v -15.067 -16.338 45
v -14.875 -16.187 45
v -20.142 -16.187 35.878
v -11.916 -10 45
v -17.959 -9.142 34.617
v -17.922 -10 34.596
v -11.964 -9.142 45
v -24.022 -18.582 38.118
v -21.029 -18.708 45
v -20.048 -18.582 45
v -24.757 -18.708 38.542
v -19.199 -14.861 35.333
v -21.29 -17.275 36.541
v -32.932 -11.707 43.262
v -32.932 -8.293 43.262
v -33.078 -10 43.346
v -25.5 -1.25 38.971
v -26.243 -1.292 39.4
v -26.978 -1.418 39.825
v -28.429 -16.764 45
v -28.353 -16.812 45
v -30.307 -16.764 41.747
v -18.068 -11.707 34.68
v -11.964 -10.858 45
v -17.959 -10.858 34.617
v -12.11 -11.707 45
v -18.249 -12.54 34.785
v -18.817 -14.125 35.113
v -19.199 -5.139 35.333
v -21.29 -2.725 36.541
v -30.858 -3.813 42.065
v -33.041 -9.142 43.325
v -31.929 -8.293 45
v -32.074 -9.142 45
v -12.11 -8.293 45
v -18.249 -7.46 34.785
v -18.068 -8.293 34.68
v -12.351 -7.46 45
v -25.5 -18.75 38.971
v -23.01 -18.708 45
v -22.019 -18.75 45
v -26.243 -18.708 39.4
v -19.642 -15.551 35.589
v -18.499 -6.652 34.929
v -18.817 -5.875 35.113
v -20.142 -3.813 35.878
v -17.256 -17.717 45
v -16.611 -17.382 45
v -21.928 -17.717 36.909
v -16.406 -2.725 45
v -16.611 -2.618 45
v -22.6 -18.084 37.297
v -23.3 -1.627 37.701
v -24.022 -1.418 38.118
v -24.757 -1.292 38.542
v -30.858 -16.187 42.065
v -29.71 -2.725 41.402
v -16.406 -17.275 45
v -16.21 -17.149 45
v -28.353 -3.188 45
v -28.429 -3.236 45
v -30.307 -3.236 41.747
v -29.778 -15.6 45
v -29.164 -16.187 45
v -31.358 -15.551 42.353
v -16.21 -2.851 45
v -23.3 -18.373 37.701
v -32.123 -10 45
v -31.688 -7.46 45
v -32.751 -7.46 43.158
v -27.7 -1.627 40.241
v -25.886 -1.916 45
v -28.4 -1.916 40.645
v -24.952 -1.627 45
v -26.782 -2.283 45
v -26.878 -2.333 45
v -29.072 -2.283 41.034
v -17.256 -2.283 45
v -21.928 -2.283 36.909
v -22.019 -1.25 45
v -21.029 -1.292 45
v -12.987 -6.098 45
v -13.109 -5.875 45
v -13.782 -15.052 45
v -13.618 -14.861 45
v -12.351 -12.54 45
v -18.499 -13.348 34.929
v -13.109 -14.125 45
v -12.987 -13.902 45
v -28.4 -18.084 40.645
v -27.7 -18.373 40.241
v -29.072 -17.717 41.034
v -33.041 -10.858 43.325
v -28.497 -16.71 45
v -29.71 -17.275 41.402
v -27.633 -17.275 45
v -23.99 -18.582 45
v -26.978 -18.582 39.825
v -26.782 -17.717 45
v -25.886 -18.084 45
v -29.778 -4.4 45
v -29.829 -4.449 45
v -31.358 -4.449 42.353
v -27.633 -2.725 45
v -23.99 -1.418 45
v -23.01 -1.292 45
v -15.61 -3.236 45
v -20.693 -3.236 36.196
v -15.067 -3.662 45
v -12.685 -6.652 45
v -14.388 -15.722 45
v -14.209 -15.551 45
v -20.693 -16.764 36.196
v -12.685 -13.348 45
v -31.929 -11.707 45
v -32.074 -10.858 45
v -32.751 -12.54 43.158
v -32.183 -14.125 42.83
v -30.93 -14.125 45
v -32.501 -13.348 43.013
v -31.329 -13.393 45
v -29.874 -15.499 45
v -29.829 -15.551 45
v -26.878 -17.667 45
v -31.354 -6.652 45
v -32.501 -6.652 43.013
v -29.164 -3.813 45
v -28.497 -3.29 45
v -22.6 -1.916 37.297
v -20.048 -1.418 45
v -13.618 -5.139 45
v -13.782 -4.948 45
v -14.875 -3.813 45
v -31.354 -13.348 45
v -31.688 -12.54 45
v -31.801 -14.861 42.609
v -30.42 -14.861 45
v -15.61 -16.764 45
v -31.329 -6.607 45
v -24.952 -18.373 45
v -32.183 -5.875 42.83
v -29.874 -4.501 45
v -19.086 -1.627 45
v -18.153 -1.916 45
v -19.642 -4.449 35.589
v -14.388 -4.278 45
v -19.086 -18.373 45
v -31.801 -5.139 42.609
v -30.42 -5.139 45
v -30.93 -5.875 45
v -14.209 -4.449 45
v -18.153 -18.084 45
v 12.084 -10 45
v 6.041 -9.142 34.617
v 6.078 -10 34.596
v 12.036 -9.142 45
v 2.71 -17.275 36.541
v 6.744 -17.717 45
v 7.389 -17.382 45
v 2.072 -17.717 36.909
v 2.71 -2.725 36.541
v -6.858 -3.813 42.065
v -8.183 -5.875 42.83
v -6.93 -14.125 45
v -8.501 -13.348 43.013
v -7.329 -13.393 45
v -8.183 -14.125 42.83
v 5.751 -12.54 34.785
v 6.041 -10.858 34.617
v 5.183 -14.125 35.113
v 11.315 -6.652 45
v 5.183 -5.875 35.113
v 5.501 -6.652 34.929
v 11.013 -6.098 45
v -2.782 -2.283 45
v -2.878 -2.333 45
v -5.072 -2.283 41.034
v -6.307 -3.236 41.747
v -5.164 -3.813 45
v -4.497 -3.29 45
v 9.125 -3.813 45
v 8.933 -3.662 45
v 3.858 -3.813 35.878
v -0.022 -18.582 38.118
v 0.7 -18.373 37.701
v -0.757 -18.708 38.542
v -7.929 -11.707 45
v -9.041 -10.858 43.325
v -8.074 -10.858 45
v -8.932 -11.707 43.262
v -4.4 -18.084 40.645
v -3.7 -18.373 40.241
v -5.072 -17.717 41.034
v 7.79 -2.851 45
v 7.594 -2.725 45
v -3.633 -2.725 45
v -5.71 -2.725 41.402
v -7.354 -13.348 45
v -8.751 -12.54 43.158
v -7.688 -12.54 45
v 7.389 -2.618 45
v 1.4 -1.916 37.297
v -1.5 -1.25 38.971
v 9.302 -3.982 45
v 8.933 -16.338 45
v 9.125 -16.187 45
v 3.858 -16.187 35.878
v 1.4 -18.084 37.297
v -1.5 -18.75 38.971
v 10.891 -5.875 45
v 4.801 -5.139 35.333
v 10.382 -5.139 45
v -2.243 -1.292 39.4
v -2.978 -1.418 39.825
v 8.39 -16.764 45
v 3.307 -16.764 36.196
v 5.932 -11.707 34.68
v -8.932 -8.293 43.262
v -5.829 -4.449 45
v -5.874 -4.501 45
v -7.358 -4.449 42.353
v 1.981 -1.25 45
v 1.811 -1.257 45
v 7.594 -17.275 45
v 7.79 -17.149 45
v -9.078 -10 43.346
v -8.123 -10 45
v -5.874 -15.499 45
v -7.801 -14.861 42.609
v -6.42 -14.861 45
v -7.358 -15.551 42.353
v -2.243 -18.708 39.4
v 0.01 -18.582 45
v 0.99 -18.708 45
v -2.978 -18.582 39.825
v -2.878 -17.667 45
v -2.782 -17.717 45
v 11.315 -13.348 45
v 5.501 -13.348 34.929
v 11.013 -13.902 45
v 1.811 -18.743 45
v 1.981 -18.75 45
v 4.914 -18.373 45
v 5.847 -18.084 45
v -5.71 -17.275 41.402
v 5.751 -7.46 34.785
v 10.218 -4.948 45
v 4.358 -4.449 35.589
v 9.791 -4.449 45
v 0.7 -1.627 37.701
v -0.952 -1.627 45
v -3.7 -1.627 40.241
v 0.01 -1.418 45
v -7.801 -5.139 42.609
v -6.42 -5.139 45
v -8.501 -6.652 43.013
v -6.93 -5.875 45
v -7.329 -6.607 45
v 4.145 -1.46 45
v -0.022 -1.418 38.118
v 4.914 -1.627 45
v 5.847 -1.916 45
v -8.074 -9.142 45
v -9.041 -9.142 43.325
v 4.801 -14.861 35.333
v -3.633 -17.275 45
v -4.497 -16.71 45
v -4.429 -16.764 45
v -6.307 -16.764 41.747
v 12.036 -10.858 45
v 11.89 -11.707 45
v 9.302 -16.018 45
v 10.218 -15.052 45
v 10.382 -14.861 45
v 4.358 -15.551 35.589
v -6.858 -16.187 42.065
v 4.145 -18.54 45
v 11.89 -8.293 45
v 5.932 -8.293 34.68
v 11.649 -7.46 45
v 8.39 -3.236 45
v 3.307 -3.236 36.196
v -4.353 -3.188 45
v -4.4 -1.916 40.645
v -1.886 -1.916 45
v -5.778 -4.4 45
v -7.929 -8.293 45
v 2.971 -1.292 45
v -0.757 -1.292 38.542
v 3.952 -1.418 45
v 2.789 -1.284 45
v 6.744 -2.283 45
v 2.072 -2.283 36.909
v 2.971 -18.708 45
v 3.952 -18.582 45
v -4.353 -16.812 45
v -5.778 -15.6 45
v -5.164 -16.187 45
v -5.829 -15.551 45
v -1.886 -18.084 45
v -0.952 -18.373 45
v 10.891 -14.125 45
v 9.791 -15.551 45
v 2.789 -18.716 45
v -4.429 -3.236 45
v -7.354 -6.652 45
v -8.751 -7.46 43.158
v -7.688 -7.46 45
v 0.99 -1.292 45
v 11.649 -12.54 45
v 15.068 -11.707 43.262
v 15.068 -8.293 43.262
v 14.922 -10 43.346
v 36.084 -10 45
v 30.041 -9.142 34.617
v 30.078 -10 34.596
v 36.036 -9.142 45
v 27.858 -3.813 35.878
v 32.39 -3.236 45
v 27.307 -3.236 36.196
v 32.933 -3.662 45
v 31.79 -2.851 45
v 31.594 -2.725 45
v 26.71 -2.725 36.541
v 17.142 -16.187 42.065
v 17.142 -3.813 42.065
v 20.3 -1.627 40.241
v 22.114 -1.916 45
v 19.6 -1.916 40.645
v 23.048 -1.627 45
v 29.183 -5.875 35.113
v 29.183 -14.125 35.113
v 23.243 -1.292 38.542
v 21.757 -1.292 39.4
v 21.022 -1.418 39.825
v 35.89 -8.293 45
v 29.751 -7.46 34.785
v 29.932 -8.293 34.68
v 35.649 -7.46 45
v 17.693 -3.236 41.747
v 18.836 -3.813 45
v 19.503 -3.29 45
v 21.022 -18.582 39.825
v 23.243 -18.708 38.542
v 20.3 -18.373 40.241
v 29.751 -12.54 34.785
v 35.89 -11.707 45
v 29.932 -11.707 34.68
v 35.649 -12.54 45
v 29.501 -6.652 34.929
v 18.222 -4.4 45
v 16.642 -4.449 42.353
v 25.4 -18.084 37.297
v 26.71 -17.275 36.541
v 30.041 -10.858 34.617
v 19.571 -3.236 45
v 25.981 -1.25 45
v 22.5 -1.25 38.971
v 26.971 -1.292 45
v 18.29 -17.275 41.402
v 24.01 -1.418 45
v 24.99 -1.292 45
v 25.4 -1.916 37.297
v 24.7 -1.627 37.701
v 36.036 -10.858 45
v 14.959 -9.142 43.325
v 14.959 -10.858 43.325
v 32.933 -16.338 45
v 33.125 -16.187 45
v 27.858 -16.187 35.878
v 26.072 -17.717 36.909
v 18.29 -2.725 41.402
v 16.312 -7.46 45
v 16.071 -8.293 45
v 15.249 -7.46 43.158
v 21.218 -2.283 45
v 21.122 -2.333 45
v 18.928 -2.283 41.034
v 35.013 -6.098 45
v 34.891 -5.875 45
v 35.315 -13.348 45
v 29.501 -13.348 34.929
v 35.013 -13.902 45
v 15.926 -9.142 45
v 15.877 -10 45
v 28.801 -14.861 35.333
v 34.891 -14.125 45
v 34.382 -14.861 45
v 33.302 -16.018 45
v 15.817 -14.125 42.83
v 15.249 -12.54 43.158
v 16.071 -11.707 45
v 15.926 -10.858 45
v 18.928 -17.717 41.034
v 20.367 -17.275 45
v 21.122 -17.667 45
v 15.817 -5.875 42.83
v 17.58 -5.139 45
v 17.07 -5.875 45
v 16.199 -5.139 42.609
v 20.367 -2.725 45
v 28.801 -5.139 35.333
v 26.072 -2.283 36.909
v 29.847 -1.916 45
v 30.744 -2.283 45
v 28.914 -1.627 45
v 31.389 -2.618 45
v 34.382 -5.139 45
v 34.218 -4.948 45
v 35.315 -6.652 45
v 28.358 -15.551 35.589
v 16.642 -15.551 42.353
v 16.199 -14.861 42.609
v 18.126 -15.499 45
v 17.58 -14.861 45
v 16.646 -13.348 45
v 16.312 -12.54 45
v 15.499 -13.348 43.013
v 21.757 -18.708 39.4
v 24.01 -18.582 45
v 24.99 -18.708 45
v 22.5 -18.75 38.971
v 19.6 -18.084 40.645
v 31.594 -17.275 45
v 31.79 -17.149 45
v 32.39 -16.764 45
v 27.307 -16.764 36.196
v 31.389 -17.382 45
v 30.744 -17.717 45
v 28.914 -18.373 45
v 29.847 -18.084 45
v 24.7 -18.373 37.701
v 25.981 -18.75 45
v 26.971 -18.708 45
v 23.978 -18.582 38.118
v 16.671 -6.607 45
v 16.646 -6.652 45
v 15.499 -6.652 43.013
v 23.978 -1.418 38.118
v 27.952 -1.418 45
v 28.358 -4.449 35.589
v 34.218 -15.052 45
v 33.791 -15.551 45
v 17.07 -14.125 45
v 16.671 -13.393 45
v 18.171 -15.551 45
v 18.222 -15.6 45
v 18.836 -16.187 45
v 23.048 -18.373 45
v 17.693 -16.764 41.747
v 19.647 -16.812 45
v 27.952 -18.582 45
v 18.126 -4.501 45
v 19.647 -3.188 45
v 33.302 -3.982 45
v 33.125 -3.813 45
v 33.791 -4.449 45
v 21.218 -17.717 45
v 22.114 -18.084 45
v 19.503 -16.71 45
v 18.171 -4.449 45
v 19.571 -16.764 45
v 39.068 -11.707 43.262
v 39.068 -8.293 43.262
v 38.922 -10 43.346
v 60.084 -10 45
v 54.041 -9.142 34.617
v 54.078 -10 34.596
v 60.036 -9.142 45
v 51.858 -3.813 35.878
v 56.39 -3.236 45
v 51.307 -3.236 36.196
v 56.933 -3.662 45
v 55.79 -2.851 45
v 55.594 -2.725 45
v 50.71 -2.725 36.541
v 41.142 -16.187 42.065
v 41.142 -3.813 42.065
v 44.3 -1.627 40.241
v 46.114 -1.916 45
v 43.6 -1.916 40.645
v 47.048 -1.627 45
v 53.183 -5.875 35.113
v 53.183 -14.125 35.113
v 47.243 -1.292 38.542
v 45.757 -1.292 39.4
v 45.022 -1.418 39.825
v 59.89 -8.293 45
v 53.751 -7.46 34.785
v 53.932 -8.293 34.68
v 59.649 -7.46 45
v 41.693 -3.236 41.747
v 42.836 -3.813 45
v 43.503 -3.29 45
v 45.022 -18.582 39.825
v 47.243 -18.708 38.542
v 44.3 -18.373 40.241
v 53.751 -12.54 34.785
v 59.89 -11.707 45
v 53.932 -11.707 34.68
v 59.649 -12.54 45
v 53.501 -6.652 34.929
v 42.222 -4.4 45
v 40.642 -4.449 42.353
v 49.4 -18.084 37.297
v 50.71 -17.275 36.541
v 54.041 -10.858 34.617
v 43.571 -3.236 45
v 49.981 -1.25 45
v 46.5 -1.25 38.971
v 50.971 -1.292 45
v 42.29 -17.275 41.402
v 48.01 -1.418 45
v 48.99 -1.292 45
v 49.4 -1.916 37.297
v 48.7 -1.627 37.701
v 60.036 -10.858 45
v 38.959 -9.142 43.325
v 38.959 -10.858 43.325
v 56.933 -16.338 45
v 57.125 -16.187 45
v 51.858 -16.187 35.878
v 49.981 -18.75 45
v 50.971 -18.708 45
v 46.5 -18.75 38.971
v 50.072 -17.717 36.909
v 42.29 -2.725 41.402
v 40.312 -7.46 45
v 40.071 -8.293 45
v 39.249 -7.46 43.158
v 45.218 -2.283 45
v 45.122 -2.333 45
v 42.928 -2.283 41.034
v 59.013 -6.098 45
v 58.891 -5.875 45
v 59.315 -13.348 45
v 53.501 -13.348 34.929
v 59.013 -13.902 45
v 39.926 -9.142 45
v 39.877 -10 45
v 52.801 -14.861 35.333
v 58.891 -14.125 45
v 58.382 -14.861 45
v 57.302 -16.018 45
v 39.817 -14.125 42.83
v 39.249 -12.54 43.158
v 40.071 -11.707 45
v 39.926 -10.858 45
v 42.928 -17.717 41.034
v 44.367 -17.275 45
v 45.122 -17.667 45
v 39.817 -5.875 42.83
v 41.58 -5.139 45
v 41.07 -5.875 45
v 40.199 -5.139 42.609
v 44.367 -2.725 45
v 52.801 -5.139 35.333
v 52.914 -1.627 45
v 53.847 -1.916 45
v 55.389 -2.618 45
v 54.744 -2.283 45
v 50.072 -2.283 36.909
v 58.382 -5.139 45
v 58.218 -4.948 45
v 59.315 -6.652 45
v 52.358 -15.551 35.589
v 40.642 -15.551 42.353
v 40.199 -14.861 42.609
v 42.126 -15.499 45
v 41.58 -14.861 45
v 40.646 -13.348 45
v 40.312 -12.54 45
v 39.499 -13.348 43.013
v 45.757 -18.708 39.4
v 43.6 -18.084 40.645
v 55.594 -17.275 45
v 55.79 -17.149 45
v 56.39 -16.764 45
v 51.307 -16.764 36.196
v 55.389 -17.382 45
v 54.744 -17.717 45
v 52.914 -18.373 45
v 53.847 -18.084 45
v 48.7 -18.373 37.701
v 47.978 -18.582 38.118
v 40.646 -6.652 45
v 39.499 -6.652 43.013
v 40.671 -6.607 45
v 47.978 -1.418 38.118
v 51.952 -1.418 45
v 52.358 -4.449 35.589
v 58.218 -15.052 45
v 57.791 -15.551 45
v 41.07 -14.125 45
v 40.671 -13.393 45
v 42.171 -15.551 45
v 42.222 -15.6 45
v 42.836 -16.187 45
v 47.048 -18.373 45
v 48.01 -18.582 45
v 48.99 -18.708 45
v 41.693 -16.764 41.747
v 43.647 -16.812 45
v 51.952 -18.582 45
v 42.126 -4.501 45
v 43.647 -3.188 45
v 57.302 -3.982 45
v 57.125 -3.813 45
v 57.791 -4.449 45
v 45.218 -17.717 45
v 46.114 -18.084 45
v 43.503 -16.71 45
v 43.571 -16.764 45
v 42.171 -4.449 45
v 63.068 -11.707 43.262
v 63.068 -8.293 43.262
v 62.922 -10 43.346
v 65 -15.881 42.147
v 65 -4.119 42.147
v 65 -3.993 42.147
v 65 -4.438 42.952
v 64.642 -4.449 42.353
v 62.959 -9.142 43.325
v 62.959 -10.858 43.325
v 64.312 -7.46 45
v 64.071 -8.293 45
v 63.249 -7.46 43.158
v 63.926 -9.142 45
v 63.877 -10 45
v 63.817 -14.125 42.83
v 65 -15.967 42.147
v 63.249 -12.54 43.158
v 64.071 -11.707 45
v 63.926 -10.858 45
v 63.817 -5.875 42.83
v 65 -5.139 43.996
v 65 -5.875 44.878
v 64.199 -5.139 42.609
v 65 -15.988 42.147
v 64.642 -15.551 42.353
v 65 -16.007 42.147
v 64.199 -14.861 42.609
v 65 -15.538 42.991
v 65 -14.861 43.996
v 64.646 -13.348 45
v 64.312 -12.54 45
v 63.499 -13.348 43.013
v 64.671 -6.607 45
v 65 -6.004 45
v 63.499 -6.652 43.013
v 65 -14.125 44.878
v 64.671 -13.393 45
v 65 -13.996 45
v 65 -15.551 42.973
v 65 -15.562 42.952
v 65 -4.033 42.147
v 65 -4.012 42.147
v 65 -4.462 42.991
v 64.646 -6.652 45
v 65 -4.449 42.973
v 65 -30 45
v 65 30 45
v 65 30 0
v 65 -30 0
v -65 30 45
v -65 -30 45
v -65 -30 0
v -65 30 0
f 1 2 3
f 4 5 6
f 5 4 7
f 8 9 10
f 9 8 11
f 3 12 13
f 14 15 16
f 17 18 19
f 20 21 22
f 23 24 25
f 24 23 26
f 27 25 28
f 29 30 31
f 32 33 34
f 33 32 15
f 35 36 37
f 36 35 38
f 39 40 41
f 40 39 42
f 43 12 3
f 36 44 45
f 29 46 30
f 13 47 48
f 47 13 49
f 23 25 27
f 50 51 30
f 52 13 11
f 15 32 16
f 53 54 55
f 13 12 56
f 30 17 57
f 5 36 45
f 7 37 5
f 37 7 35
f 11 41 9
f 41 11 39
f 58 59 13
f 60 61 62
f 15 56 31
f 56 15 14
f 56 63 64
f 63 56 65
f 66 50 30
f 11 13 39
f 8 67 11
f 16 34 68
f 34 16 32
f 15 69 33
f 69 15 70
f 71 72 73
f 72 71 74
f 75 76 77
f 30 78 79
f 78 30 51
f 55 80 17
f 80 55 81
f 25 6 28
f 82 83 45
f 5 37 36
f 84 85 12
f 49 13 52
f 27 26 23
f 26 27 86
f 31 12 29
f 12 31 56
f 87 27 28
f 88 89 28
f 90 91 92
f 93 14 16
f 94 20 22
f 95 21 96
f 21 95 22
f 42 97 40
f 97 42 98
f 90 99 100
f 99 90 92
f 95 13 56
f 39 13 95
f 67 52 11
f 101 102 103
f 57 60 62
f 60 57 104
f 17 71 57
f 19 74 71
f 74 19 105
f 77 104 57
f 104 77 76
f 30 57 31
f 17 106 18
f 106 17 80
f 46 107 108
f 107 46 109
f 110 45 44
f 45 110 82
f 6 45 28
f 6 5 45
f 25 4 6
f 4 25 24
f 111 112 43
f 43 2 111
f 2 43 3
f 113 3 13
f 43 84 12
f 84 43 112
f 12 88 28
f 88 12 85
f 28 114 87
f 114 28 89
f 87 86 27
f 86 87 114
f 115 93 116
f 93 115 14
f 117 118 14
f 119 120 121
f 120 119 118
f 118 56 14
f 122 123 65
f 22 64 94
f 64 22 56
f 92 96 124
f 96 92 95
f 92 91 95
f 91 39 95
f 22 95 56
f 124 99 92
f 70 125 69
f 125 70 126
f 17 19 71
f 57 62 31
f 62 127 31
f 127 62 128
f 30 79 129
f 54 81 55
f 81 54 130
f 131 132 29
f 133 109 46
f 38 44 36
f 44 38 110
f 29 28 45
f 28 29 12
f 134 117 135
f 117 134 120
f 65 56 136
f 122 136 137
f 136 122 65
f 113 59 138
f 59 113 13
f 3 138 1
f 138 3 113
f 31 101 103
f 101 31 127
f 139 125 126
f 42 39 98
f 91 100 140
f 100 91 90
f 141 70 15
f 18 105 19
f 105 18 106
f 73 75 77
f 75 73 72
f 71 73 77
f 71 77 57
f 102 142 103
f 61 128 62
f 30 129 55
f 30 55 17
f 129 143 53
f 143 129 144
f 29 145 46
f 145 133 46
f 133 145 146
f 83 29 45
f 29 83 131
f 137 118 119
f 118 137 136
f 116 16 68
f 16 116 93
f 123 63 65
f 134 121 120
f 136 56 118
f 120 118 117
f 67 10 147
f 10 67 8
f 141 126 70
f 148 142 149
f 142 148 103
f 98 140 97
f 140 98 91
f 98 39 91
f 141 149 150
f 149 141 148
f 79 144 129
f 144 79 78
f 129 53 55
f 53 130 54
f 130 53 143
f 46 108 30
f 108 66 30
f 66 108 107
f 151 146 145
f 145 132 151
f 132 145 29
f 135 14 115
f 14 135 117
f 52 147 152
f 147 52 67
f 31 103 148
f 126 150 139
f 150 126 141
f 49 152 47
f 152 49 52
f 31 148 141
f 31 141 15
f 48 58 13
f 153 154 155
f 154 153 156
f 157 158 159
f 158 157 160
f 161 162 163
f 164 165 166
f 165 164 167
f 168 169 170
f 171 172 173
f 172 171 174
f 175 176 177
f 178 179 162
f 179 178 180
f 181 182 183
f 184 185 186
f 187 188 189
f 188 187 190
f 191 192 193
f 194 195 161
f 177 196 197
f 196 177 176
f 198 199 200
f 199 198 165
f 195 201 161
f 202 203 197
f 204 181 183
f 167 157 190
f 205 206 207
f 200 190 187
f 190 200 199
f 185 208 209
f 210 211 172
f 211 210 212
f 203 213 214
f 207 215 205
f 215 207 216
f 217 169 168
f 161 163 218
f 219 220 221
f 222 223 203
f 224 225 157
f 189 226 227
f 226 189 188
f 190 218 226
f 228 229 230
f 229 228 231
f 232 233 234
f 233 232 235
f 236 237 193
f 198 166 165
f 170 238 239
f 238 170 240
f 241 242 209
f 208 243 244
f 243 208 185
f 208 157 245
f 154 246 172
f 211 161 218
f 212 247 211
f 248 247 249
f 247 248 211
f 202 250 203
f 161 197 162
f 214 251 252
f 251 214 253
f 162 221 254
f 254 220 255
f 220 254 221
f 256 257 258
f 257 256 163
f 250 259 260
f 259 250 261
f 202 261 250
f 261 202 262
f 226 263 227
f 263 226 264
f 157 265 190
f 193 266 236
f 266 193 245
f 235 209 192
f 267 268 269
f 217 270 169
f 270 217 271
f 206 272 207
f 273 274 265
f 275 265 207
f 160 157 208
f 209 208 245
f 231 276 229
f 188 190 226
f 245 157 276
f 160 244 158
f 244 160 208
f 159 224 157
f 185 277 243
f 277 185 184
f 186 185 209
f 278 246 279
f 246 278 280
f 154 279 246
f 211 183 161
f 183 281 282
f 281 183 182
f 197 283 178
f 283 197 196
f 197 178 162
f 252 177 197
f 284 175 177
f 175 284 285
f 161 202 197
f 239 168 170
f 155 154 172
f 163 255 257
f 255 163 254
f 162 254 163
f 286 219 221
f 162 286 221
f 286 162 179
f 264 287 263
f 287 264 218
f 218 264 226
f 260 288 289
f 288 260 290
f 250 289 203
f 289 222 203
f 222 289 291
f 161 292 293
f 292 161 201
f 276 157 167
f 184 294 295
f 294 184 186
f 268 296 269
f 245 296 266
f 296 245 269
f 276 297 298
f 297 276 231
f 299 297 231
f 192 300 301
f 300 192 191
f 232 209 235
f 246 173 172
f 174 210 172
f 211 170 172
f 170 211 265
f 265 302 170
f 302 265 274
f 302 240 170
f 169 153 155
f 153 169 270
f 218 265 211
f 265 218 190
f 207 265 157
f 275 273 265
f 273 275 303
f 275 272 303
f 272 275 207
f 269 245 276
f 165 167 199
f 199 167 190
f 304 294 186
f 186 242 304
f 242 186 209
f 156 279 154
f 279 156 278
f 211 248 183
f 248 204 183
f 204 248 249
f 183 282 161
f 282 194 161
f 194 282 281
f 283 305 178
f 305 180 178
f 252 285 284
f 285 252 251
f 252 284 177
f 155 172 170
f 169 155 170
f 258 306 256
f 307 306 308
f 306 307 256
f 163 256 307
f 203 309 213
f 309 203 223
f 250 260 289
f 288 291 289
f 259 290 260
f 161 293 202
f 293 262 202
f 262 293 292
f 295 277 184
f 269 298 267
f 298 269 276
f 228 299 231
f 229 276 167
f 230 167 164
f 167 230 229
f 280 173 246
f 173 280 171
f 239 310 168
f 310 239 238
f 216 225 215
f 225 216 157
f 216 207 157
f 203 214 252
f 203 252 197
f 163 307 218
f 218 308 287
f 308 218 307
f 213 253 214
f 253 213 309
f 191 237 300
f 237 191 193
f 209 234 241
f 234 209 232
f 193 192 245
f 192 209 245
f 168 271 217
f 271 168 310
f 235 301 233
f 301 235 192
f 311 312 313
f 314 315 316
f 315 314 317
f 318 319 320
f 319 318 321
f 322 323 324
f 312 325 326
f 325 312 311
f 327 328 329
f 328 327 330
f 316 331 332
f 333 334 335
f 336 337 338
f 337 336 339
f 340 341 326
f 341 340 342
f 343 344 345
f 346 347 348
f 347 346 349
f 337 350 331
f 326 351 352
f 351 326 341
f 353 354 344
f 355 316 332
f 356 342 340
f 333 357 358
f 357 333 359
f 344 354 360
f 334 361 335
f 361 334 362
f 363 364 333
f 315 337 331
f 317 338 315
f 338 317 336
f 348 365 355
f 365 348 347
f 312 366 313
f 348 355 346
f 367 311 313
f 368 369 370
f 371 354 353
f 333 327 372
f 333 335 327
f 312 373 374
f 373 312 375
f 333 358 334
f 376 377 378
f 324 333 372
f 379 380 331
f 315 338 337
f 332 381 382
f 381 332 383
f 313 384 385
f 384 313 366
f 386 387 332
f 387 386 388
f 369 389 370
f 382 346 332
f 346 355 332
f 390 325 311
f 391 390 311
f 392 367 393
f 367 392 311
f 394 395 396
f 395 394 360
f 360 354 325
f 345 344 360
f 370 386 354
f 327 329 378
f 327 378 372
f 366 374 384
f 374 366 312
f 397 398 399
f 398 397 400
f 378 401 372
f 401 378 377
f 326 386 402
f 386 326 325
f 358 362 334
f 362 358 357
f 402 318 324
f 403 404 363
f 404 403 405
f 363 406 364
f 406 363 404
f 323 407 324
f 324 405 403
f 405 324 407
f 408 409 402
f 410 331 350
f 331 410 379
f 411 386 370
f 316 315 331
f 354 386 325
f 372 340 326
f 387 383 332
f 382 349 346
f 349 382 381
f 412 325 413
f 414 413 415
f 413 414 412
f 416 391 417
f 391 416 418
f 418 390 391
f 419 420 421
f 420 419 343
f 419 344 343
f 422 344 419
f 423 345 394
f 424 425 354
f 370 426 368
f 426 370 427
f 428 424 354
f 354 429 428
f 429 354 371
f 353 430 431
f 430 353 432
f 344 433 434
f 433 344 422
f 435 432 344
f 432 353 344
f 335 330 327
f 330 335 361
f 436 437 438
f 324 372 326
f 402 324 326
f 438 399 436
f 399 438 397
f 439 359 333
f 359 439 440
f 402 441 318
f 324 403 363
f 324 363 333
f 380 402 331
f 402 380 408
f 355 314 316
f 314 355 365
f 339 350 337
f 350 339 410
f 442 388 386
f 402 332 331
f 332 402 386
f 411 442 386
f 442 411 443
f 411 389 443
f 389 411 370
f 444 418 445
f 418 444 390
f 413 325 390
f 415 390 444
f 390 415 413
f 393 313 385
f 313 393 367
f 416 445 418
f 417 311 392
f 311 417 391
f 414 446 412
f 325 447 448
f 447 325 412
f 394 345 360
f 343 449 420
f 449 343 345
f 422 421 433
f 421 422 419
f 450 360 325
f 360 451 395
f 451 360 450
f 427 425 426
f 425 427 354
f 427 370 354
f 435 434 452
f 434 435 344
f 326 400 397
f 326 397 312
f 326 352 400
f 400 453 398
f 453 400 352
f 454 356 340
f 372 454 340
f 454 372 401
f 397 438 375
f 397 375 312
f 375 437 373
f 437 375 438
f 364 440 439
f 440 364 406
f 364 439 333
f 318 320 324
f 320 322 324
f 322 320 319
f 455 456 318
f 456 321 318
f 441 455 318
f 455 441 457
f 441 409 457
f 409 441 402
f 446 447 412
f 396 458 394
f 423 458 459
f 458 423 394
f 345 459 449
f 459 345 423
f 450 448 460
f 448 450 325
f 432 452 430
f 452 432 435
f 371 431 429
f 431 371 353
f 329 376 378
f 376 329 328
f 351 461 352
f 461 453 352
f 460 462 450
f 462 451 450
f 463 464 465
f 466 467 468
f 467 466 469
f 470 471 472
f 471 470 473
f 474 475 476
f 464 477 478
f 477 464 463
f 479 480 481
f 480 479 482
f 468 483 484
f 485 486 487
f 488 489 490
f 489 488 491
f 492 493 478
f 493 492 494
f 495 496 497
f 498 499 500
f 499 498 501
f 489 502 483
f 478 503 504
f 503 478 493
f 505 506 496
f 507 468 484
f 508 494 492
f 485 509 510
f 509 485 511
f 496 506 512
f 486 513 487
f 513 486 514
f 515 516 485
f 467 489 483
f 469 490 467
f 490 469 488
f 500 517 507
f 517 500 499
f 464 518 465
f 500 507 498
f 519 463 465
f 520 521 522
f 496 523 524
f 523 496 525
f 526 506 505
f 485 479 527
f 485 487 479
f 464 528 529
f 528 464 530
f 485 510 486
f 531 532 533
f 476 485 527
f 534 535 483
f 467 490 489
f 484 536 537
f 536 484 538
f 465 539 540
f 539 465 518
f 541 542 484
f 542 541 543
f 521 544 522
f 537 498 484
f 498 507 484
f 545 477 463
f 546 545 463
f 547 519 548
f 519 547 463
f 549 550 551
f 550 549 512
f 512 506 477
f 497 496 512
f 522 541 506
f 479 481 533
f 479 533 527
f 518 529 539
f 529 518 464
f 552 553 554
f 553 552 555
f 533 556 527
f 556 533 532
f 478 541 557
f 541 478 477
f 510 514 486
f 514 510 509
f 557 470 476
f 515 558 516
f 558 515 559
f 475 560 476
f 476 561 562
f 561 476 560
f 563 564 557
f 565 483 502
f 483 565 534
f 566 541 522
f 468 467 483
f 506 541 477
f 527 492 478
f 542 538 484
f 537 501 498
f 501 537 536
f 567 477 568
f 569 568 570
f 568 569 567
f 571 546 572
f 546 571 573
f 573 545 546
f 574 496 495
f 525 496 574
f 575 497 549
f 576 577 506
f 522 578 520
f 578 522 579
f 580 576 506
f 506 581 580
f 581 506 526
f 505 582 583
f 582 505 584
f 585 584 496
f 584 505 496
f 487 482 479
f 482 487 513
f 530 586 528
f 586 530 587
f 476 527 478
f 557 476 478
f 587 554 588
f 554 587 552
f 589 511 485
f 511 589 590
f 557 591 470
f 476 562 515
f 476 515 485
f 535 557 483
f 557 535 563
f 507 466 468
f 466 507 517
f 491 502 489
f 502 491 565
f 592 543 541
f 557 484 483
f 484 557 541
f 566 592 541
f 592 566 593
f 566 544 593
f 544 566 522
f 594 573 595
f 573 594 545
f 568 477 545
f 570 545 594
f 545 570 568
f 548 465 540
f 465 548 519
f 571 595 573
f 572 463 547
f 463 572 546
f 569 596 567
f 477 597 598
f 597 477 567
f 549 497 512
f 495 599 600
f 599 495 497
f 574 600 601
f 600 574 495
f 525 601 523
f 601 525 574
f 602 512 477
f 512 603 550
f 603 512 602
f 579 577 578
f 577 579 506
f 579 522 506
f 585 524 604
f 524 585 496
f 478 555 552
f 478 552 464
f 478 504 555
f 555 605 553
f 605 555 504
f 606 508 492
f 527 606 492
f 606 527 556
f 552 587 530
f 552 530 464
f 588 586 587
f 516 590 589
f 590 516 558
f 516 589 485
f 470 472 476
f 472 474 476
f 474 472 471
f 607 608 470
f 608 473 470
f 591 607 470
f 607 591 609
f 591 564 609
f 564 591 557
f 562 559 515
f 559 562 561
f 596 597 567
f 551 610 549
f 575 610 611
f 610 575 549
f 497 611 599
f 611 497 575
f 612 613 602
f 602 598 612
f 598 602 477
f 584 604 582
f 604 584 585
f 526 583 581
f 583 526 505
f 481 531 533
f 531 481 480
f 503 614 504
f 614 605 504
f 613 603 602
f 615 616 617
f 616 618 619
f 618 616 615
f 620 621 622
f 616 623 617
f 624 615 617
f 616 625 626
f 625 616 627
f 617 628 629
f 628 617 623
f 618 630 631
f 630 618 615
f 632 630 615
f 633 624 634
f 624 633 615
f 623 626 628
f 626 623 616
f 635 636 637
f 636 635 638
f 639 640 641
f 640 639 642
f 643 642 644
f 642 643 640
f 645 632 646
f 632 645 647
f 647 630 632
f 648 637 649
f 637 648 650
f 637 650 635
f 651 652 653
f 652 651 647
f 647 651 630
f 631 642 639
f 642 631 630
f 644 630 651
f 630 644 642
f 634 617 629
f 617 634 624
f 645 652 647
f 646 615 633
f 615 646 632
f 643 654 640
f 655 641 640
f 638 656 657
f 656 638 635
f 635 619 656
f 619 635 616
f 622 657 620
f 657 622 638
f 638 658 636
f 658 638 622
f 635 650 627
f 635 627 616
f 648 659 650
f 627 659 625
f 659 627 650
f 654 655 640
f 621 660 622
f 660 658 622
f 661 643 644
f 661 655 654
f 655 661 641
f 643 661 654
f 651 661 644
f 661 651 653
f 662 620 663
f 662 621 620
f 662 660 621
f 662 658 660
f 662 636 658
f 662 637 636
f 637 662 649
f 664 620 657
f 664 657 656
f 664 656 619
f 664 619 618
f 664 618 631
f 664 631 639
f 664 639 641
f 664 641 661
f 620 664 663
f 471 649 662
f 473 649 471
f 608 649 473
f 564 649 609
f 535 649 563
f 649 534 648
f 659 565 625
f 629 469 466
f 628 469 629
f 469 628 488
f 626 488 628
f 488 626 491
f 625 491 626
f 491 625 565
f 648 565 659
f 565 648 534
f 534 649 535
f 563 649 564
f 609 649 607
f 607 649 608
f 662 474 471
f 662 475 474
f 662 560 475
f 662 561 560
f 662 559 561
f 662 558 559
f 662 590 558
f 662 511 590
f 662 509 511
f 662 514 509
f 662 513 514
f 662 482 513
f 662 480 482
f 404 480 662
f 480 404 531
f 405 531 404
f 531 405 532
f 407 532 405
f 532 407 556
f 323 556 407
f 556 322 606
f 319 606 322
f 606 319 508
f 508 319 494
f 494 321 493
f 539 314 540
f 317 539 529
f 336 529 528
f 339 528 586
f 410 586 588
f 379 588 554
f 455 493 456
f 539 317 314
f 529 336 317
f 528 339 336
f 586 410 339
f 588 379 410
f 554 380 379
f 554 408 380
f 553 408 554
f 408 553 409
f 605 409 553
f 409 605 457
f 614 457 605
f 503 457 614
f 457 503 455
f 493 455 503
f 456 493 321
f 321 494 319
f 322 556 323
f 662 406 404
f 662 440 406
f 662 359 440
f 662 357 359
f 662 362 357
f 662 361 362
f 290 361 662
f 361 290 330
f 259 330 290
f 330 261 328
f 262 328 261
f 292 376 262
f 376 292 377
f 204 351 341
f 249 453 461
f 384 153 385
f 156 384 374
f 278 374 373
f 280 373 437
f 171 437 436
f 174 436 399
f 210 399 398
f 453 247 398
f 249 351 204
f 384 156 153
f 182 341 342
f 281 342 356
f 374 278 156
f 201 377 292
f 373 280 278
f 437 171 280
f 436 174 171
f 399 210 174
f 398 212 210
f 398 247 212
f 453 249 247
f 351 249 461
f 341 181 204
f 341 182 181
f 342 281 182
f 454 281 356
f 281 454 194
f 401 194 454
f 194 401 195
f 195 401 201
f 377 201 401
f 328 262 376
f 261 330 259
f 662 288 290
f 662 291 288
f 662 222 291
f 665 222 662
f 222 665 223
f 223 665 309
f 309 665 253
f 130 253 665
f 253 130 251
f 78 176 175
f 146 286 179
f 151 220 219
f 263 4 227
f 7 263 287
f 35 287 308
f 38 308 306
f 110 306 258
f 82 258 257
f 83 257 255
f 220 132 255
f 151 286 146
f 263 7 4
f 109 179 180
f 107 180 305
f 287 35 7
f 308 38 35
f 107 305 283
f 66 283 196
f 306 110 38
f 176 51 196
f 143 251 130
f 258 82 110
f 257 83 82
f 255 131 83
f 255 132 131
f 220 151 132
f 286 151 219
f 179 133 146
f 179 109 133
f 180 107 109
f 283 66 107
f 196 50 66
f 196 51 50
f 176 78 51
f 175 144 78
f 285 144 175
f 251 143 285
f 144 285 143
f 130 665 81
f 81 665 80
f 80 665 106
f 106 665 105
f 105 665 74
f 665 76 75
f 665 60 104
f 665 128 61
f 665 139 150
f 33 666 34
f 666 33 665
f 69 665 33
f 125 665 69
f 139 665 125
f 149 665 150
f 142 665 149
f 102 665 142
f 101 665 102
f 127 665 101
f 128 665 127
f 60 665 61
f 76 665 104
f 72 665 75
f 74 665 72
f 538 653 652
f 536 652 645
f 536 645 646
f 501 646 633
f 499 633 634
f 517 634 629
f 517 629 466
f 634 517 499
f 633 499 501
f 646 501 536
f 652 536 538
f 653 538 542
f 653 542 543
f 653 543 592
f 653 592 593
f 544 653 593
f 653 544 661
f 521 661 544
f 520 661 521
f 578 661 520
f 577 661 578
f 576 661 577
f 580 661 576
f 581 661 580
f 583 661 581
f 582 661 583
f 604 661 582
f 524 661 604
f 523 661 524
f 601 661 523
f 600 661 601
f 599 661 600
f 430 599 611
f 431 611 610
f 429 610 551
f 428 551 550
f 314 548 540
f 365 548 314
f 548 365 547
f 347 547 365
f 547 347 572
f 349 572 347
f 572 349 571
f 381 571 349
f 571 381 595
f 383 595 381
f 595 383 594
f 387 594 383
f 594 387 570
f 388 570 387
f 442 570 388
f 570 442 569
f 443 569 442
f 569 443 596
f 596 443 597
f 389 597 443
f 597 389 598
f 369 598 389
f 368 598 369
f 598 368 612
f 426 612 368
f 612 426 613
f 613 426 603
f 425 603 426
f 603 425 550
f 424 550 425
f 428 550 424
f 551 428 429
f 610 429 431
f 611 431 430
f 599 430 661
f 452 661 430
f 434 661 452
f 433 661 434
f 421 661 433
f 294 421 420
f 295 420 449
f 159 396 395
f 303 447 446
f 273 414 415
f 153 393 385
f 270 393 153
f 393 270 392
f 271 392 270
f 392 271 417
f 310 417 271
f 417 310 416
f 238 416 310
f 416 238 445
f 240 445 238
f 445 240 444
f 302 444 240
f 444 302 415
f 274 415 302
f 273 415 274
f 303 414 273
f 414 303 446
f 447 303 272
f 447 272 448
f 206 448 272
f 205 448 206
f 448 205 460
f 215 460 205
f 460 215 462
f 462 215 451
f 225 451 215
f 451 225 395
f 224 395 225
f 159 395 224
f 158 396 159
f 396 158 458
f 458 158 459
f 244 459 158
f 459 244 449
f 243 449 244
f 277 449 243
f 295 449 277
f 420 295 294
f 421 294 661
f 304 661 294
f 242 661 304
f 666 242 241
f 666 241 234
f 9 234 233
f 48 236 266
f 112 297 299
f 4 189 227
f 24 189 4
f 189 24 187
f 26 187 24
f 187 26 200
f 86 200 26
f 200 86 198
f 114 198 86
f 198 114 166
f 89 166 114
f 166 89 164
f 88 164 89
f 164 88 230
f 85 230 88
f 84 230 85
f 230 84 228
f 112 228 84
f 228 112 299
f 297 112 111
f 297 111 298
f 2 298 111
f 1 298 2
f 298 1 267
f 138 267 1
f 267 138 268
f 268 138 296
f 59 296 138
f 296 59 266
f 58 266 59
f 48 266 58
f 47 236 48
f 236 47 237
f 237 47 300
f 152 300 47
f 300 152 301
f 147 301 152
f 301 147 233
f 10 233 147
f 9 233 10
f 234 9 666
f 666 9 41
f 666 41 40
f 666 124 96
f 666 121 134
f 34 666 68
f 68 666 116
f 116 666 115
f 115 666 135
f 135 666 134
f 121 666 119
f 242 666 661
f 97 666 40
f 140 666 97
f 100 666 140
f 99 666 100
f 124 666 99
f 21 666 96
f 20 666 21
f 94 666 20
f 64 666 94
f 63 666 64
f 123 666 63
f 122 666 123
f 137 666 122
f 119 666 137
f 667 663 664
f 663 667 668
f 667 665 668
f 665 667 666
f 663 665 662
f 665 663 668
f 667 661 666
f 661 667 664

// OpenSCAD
// 15 mL conical tube rack – 5 tubes, 30° lean, for volume reading / supernatant pipetting
// Units: mm. Part rests on the XY plane (z = 0) and is centred on the origin in X and Y.

// ---- Block dimensions (measured with calipers) ----
L = 130;   // block length along X
W = 60;    // block depth along Y
H = 45;    // block height along Z

// ---- Hole / tube parameters ----
n_tubes   = 5;    // number of tubes
spacing   = 24;   // centre-to-centre spacing of hole axes along X
hole_d    = 17.5; // hole diameter, measured square to its axis
hole_depth= 40;   // hole depth measured along its axis, from the top face
y_top     = -10;  // Y coordinate where each hole axis meets the top face (z = H)
tilt      = 30;   // lean angle from vertical, in the YZ plane (down into block -> +Y)

// ---- Derived geometry ----
// A 30° tilt from vertical means the axis makes 60° with the +Z axis,
// so the unit vector pointing down into the block is (0, sin60, -cos60).
down_vec  = [0, sin(60), -cos(60)];   // direction from top face into the block
top_pt    = [0, y_top, H];            // point where the axis meets the top face
bot_pt    = top_pt + hole_depth * down_vec; // flat bottom of the blind hole

// ---- Build ----
$fn = 64;

difference() {
    // Solid block, centred on the origin in X and Y, resting on z = 0
    translate([-L/2, -W/2, 0])
        cube([L, W, H]);

    // Five blind holes, each a cylinder with a flat end square to its axis
    for (i = [0 : n_tubes]) {
        x = (i - (n_tubes - 1) / 2) * spacing;   // centred on the block in X
        translate([x, 0, 0])
            rotate([0, tilt, 0])                 // tilt the axis 30° in the YZ plane
            translate([0, y_top, H])             // axis meets the top face at y = -10
            cylinder(h = hole_depth, r = hole_d / 2, $fn = 64);
    }
}
